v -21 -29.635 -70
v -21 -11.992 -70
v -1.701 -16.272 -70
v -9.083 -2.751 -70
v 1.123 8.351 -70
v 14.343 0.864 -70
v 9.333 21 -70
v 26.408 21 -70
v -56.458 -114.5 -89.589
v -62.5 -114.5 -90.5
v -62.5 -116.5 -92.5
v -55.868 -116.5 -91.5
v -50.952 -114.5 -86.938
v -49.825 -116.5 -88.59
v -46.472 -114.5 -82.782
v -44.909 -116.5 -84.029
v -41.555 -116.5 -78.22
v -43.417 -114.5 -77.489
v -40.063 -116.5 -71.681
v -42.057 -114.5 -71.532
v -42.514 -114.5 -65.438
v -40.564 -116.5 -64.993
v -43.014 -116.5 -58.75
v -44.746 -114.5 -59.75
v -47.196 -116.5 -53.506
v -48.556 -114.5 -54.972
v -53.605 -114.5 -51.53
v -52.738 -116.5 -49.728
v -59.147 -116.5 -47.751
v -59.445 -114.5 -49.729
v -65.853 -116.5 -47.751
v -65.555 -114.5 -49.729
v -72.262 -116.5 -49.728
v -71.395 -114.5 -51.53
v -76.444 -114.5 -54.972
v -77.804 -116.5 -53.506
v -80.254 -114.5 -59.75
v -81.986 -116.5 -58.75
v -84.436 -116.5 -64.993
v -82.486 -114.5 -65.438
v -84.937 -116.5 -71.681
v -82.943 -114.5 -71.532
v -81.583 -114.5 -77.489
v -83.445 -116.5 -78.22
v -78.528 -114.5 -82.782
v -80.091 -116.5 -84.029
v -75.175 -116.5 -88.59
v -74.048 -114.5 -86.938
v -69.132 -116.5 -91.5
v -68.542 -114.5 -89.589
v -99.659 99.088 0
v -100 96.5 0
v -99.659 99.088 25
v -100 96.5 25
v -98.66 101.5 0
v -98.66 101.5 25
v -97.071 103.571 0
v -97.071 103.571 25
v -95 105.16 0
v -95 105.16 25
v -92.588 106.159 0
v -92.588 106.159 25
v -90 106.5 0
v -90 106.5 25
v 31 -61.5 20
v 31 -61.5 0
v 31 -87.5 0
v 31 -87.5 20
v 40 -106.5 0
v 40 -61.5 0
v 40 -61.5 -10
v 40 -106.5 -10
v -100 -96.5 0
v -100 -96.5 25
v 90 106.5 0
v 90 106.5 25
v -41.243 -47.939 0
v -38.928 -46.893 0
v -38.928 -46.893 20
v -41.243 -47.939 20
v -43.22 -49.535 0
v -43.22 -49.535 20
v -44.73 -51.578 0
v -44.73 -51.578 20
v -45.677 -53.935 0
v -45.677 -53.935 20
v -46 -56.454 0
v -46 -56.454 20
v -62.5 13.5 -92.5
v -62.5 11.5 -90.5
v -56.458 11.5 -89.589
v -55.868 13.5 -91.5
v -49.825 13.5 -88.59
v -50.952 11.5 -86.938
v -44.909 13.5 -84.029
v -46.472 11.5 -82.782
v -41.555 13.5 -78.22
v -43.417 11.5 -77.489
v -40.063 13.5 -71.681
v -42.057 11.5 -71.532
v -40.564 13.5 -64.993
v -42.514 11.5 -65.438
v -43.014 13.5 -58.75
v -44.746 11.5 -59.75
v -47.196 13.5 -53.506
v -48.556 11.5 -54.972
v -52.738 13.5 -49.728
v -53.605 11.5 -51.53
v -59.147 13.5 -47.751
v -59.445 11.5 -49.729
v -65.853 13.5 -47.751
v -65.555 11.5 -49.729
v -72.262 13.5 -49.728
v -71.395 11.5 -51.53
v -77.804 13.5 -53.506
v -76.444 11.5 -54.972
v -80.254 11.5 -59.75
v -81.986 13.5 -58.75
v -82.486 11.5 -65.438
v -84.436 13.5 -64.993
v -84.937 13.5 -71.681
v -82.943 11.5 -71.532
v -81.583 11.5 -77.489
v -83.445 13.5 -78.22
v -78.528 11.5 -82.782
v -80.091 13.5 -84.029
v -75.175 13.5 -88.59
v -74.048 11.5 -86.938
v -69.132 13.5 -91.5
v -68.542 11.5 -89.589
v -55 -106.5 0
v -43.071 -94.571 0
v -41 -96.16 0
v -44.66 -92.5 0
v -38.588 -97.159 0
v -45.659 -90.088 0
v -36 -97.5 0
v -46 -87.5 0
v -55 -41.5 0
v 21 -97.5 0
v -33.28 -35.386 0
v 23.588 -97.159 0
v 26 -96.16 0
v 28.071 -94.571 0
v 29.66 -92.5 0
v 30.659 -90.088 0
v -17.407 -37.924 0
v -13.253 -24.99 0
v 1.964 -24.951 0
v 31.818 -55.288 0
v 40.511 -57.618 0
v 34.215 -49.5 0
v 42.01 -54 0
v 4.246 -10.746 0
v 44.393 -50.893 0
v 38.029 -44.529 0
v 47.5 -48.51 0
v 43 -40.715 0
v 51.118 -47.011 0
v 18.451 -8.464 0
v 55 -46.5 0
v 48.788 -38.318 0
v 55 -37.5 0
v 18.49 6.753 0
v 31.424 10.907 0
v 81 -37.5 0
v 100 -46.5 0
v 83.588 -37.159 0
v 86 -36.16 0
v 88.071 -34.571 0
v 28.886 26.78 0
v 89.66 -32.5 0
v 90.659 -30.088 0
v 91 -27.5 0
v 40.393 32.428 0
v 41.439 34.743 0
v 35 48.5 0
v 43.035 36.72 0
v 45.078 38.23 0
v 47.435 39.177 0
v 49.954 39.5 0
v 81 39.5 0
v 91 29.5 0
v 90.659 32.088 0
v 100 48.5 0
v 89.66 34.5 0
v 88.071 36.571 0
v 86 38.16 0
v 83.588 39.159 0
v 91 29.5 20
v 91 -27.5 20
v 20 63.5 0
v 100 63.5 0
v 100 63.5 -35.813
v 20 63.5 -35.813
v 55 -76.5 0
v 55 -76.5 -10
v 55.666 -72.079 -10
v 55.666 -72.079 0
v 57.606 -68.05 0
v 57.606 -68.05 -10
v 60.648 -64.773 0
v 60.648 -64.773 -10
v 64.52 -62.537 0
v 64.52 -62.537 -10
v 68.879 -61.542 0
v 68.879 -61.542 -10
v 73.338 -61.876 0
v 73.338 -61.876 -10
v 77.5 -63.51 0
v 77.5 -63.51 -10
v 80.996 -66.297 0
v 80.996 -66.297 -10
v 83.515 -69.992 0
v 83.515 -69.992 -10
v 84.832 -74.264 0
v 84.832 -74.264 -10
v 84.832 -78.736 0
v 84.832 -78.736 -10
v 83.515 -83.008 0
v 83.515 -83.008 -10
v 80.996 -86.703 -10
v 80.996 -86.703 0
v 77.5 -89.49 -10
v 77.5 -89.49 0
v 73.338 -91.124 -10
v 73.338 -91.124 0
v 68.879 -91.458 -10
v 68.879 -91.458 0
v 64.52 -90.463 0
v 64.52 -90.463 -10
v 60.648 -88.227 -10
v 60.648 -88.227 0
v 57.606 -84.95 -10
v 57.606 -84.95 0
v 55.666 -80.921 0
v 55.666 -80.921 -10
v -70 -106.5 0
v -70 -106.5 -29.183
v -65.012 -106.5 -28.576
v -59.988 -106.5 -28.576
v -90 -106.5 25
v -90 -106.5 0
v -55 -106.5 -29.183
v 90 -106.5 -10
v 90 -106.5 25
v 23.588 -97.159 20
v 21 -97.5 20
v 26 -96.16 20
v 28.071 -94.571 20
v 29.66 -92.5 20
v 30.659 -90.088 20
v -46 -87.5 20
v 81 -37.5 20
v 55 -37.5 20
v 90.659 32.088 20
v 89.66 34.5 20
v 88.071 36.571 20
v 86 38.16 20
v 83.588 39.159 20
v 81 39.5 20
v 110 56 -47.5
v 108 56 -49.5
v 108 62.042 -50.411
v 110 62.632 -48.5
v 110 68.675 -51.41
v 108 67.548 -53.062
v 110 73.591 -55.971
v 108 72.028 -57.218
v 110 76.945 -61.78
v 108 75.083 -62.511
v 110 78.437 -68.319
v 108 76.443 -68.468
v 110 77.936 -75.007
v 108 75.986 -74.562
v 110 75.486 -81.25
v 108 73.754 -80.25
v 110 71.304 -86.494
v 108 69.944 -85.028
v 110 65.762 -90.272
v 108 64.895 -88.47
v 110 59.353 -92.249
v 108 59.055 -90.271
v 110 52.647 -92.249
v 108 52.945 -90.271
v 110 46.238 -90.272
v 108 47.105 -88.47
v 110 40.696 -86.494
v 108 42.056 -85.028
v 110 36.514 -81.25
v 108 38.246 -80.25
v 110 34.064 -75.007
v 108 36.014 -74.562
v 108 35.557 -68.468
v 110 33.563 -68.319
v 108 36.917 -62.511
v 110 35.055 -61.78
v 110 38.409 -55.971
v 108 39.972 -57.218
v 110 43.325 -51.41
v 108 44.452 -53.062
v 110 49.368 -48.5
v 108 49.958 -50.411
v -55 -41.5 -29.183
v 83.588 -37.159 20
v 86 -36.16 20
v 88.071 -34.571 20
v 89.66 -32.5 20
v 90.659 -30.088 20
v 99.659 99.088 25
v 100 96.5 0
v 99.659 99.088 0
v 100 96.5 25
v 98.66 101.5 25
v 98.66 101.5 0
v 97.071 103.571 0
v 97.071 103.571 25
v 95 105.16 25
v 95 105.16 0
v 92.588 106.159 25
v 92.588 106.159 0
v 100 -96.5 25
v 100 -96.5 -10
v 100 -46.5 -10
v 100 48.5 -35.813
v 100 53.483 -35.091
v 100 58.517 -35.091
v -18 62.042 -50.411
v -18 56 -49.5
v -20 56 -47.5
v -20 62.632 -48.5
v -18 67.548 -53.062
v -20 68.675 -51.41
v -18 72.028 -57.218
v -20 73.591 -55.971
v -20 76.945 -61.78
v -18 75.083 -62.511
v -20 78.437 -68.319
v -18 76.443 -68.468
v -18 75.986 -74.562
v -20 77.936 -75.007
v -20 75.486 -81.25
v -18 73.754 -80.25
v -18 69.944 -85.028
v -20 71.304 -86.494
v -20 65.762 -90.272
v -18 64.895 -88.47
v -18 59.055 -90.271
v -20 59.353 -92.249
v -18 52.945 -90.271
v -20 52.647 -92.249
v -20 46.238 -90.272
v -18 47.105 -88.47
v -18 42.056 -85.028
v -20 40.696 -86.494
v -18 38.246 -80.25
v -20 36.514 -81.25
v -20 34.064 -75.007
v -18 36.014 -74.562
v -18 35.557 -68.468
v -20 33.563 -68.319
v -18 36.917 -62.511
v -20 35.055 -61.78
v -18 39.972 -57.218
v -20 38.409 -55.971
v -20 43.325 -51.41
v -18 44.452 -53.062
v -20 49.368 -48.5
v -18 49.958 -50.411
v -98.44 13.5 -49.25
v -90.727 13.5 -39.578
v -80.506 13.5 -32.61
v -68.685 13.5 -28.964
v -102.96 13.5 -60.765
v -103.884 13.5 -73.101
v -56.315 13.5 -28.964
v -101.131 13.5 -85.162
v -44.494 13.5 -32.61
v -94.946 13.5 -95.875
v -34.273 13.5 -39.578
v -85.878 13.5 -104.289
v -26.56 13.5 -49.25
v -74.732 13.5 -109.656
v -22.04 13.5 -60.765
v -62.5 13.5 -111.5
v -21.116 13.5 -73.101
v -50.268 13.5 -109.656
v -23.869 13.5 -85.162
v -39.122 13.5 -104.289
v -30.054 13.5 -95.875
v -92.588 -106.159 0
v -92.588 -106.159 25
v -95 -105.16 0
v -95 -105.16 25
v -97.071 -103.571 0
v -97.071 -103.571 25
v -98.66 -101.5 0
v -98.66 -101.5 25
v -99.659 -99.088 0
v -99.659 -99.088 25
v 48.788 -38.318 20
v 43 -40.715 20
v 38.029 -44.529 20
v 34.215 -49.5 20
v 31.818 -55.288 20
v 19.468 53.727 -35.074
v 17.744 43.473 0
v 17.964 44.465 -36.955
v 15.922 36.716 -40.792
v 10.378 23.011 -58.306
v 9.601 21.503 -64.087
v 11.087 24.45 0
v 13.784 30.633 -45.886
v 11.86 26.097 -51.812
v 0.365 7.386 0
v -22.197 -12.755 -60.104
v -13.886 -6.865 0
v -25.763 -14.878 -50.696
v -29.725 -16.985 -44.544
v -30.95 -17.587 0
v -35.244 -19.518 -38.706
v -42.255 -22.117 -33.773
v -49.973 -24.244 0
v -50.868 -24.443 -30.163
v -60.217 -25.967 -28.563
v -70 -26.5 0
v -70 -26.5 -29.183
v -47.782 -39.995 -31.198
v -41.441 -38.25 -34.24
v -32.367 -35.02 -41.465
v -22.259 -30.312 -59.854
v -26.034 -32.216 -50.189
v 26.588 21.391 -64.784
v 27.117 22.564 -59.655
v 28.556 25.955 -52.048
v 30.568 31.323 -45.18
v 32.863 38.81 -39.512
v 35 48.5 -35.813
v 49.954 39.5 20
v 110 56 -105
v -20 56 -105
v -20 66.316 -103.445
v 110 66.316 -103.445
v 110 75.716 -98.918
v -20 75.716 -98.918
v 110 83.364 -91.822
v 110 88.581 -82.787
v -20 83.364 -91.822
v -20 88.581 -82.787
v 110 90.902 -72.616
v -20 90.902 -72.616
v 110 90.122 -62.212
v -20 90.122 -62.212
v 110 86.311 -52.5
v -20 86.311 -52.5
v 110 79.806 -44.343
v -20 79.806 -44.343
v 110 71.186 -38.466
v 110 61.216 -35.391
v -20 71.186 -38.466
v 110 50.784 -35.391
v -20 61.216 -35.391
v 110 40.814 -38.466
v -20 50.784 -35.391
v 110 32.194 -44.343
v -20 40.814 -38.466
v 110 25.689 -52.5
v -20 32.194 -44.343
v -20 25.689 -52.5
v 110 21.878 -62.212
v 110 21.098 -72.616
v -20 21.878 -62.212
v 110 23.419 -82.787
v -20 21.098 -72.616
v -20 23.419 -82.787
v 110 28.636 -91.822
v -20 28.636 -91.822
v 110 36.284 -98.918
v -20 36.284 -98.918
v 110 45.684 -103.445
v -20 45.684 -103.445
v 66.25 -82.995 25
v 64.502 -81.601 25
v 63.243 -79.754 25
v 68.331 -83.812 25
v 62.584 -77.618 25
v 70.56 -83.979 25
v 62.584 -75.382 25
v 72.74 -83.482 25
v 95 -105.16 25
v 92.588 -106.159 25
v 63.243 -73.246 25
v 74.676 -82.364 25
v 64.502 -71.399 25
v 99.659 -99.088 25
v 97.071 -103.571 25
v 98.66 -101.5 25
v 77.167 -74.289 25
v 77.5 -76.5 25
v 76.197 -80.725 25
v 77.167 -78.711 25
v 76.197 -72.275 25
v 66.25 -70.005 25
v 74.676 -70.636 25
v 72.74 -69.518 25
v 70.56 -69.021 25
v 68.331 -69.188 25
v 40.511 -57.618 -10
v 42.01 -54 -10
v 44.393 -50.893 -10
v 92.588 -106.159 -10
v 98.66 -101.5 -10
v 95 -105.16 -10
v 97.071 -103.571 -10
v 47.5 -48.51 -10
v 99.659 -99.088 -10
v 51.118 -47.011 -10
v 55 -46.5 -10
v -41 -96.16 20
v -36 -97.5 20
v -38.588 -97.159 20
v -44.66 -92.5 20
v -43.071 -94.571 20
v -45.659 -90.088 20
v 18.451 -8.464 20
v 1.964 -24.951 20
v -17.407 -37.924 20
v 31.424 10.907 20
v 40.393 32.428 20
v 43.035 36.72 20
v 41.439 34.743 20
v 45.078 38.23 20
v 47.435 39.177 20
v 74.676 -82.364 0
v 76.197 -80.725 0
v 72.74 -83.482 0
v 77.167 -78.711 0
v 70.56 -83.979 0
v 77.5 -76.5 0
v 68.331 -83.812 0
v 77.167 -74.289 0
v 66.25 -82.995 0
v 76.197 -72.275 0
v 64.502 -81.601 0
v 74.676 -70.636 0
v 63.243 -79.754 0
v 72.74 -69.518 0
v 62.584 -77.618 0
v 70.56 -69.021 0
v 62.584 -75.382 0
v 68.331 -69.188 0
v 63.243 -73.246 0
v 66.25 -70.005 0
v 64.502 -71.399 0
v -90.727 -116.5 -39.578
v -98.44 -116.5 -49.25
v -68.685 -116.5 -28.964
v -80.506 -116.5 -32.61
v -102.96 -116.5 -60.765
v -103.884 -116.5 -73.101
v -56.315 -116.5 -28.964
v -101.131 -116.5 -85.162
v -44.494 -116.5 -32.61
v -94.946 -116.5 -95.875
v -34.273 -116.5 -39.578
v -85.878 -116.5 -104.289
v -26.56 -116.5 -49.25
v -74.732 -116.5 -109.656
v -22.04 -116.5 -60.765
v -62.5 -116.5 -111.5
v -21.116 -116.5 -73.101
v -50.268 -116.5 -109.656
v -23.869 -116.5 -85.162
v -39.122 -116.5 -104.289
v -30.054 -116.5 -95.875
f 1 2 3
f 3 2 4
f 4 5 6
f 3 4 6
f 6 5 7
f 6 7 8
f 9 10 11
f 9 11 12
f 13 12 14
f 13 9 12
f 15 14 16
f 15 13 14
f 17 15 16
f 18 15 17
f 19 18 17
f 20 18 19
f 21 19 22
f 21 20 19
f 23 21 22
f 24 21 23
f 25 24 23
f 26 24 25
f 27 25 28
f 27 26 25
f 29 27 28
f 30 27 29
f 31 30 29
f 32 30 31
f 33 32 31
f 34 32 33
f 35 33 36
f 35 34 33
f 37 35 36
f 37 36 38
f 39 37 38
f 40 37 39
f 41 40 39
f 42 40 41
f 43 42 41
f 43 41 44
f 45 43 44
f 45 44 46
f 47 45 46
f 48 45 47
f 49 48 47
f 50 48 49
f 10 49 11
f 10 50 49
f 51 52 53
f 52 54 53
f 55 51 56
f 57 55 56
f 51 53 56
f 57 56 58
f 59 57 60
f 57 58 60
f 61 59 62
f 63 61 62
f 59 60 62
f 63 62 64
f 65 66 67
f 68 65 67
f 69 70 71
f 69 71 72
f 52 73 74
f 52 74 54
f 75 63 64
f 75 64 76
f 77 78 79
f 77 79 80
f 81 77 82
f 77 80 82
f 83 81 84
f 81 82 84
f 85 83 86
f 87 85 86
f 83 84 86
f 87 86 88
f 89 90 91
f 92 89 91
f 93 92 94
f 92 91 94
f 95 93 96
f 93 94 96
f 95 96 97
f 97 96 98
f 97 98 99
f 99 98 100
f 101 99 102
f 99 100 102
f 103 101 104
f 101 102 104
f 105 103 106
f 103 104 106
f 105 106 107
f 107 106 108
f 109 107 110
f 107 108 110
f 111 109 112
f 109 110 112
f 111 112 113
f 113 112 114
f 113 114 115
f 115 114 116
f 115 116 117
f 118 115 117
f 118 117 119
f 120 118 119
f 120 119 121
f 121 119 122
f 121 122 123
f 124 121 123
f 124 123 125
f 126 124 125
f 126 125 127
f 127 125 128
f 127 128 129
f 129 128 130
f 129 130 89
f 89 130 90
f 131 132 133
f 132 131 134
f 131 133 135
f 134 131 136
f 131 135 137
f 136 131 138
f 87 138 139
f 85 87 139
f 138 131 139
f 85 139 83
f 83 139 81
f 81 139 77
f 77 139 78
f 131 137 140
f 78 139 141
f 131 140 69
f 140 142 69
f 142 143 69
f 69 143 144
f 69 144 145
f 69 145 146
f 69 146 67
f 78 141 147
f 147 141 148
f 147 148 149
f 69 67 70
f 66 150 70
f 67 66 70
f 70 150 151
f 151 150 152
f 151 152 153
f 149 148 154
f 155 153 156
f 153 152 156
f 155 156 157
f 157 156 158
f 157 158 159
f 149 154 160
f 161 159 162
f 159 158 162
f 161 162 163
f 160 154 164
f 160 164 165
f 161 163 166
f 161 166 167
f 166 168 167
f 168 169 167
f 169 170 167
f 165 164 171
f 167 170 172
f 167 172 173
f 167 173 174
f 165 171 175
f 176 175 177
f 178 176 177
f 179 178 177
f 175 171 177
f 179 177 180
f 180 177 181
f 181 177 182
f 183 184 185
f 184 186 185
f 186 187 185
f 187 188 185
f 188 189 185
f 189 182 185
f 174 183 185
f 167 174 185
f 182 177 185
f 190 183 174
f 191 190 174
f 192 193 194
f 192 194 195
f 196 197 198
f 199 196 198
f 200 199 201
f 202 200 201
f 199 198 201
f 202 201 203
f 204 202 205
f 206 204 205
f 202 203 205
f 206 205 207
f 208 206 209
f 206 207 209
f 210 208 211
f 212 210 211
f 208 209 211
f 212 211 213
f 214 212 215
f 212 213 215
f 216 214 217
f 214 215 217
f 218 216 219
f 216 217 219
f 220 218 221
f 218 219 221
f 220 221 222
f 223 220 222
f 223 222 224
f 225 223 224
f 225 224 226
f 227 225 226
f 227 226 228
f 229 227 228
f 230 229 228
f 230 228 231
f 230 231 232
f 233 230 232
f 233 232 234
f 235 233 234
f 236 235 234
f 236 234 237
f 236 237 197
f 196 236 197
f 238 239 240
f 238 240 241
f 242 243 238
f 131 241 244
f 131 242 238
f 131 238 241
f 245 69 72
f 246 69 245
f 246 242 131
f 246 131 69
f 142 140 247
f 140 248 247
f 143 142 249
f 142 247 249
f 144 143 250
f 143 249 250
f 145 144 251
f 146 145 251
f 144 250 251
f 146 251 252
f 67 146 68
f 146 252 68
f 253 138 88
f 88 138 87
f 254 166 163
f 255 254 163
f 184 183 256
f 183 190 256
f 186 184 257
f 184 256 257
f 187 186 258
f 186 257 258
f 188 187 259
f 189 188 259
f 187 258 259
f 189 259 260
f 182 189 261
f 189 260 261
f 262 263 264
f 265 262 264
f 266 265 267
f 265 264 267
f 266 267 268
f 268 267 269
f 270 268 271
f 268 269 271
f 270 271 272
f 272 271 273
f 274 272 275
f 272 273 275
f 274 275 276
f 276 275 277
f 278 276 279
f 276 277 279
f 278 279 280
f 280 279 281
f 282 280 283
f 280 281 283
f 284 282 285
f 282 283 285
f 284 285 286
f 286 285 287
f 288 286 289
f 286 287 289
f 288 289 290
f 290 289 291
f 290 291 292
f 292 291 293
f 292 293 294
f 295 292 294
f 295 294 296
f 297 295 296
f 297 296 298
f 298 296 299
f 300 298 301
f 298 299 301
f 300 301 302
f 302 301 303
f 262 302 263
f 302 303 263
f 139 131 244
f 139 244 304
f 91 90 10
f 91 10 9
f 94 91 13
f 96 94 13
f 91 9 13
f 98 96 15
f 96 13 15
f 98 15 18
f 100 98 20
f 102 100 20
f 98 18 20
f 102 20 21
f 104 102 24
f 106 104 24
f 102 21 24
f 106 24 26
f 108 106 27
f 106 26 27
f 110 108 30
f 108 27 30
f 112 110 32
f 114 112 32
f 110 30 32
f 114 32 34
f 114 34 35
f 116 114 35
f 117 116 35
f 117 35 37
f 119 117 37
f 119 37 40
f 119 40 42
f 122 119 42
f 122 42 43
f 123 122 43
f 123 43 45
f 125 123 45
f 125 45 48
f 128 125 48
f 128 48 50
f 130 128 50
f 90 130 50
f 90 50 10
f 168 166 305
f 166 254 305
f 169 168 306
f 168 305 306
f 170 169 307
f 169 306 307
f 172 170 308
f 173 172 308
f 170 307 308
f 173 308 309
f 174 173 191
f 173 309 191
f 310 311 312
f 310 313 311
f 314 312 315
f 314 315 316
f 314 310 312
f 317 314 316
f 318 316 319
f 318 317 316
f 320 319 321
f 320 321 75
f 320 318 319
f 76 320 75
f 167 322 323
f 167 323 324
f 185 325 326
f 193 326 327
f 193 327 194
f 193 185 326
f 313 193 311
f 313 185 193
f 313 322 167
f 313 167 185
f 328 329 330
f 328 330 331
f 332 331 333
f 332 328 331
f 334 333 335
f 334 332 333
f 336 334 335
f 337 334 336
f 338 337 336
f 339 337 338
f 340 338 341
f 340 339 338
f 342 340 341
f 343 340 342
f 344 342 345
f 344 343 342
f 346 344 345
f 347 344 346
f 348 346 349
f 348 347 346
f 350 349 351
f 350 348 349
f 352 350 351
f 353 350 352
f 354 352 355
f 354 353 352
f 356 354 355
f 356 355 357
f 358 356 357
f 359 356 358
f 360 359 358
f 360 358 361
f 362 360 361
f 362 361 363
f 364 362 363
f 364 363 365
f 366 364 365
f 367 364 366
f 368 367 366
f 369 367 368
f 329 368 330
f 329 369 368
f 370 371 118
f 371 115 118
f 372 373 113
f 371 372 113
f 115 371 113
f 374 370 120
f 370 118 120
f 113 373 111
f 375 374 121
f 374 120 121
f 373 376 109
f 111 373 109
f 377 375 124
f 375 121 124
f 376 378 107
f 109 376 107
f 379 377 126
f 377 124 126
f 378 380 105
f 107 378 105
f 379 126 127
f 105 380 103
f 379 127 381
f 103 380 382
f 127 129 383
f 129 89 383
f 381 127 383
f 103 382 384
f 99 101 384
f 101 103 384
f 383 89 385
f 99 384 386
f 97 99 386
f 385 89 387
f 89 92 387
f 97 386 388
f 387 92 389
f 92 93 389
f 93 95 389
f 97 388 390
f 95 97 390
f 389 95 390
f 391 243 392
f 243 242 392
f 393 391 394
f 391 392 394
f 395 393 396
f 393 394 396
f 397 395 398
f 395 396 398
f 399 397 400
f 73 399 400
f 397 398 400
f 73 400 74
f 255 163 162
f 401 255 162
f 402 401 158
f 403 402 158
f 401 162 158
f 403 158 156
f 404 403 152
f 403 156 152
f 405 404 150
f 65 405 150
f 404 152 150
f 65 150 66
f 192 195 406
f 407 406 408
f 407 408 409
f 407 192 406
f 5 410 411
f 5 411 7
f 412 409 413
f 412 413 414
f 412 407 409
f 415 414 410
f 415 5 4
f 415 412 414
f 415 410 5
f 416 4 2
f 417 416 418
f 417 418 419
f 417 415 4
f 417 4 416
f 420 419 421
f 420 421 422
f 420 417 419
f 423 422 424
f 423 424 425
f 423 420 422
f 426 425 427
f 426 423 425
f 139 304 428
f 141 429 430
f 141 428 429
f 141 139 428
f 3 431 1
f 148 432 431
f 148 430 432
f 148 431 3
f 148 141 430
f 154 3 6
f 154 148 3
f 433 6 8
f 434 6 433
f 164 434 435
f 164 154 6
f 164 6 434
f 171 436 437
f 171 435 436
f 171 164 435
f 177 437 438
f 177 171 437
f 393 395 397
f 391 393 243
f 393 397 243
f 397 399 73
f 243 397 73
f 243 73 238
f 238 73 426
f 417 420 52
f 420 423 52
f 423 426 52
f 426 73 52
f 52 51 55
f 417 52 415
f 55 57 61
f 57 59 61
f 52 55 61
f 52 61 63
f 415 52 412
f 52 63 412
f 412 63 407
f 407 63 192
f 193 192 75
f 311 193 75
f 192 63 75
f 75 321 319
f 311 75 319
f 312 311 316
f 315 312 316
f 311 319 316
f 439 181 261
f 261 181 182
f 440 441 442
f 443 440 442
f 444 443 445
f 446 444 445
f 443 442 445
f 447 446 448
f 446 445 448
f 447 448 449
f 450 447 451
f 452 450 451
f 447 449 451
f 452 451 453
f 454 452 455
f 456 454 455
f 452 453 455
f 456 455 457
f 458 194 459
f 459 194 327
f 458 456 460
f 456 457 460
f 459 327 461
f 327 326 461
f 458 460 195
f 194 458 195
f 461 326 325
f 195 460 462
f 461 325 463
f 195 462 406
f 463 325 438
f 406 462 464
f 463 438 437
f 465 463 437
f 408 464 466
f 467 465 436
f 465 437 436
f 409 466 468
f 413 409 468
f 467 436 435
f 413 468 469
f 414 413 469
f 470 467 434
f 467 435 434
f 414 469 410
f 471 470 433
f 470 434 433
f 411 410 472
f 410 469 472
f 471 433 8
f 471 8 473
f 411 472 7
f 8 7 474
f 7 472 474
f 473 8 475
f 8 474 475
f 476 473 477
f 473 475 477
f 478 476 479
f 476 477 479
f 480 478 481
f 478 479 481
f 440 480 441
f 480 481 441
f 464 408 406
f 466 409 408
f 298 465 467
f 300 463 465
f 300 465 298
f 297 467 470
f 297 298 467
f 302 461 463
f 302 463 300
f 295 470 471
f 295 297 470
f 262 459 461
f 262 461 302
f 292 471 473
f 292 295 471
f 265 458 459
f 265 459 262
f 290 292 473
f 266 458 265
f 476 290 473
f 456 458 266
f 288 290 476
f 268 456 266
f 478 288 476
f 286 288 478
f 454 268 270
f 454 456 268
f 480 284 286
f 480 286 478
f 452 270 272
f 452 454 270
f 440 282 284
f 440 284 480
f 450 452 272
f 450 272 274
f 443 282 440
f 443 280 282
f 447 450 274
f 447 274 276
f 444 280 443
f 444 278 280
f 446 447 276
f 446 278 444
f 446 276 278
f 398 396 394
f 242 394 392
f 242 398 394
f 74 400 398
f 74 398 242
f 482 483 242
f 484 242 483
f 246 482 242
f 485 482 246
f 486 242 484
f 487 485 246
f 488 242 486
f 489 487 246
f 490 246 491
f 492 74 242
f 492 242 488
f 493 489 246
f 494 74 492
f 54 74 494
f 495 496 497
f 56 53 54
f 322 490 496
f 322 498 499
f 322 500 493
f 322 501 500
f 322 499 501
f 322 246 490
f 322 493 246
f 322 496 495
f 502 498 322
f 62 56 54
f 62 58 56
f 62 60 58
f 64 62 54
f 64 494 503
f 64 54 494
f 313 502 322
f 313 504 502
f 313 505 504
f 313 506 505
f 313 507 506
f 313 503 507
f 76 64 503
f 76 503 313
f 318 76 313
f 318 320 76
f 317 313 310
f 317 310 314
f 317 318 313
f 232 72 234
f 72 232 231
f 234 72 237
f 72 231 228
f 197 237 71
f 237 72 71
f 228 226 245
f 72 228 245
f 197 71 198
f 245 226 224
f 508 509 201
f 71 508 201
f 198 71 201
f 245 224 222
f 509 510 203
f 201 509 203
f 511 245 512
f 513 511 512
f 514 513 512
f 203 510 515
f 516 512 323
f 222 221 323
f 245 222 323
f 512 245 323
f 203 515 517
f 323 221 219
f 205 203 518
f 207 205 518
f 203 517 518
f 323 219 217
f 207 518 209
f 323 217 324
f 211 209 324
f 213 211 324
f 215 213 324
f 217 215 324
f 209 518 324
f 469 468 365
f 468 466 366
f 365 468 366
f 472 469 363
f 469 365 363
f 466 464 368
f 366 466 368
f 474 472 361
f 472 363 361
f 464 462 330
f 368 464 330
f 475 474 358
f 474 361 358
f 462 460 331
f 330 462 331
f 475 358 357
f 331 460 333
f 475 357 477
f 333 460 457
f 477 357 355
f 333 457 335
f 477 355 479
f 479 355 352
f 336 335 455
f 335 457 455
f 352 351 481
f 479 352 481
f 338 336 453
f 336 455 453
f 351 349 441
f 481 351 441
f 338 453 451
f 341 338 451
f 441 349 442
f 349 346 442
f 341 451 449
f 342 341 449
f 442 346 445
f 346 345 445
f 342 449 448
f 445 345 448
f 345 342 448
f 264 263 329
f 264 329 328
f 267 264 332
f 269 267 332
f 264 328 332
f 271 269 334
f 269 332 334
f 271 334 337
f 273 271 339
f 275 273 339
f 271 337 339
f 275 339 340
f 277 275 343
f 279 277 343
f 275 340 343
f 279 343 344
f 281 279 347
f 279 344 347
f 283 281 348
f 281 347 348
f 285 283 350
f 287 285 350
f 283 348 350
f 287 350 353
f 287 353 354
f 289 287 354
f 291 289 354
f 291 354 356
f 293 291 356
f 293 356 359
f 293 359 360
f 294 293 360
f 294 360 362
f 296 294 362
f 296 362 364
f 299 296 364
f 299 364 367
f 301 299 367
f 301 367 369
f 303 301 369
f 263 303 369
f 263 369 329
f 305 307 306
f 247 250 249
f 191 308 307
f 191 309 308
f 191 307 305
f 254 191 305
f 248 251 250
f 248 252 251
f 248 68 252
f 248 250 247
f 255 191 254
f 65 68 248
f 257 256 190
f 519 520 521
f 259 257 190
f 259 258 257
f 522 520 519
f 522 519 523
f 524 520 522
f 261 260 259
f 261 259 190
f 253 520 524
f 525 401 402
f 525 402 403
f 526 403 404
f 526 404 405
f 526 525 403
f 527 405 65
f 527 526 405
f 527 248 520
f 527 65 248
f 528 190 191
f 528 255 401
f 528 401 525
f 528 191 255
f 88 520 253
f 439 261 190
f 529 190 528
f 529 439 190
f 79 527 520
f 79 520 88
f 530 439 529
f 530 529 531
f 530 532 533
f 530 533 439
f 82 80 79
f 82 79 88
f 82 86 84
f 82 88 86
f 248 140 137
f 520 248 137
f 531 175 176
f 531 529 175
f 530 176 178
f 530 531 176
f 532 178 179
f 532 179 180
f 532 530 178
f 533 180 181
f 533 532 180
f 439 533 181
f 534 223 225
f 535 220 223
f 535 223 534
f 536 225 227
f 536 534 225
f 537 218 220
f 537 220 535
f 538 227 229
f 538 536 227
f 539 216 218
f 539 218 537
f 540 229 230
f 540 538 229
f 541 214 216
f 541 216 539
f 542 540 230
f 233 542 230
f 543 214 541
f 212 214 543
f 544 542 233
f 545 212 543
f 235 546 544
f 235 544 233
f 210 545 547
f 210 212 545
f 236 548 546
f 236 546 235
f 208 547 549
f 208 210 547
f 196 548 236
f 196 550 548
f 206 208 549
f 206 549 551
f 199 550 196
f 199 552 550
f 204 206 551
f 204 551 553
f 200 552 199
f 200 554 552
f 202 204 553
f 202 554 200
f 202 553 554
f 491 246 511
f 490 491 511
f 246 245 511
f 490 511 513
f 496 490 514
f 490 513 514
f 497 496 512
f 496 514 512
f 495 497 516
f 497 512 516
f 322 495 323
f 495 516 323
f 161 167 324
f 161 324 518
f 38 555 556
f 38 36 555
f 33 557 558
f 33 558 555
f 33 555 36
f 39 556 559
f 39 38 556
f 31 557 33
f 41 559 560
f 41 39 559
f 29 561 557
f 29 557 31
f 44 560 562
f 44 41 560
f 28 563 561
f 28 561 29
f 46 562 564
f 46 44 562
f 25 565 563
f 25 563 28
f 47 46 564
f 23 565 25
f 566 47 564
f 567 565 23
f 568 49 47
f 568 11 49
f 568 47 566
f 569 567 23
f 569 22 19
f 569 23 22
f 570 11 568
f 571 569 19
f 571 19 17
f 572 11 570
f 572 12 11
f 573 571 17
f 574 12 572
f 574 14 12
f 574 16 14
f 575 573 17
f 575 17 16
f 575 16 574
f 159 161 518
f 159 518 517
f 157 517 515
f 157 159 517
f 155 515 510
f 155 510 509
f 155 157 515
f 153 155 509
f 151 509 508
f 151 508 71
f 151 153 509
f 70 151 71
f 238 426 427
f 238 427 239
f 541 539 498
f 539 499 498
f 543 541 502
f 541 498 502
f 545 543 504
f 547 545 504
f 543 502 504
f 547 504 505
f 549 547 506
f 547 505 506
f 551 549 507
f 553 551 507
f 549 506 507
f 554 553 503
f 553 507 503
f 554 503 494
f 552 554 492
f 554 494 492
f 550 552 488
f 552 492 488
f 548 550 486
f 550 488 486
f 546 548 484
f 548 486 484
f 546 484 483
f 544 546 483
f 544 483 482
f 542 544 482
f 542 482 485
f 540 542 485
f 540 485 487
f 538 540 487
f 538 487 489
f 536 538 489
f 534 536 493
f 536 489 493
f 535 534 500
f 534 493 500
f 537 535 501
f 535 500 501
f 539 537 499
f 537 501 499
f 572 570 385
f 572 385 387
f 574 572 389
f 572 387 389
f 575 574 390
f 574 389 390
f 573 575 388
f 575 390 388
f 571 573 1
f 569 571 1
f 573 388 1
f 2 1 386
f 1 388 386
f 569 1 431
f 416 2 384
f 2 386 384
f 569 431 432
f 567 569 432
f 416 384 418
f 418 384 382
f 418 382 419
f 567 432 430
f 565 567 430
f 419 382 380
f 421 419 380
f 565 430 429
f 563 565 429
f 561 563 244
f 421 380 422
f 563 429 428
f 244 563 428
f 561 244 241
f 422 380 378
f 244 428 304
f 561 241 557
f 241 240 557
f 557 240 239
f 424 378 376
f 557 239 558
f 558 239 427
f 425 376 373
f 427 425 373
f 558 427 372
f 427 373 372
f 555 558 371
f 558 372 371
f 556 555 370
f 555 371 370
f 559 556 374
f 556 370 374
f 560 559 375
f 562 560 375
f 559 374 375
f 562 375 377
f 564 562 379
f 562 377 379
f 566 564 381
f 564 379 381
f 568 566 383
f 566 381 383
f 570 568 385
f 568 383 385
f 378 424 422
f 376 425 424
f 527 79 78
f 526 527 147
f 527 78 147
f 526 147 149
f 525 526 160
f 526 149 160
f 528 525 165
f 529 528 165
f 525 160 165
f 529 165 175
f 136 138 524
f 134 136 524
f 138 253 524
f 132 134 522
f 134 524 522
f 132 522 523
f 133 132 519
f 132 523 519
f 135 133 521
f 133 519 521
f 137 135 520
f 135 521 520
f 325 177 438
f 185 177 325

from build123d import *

# Parameters (mm, degrees)
SKETCH1_W                               = 200
SKETCH1_H                               = 213
BOSS_EXTRUDE1_DEPTH                     = 25
BOSS_EXTRUDE2_DEPTH                     = 10
BOSS_EXTRUDE3_DEPTH                     = 70
CUT_EXTRUDE1_DEPTH                      = 20
BOSS_EXTRUDE5_DEPTH                     = 10
BOSS_EXTRUDE5_DEPTH_BACK                = 120
SKETCH5_R                               = 35
BOSS_EXTRUDE6_DEPTH                     = 10
BOSS_EXTRUDE6_DEPTH_BACK                = 120
SKETCH6_R                               = 41.5
CUT_EXTRUDE2_REACH                      = 274.509
SKETCH7_R                               = 20.5
CUT_EXTRUDE3_REACH                      = 209.134
SKETCH8_R                               = 20.5
CBORE_FOR_M8_HEX_HEAD_BOLT1_D           = 15
CBORE_FOR_M8_HEX_HEAD_BOLT1_CBORE_D     = 30
CBORE_FOR_M8_HEX_HEAD_BOLT1_CBORE_DEPTH = 10
CHAMFER1_SIZE                           = 2
FILLET1_R                               = 10


with BuildPart() as part:
    # Sketch1 → Boss-Extrude1 (new body)
    with BuildSketch(Plane.XY):
        Rectangle(SKETCH1_W, SKETCH1_H)
    extrude(amount=BOSS_EXTRUDE1_DEPTH)

    # Sketch2 → Boss-Extrude2 (add)
    with BuildSketch(Plane.XY):
        with BuildLine():
            Line((100, -46.5), (55, -46.5))
            ThreePointArc((55, -46.5), (44.393398282, -50.893398282), (40, -61.5))
            Line((40, -61.5), (40, -106.5))
            Line((40, -106.5), (100, -106.5))
            Line((100, -106.5), (100, -46.5))
        make_face()
    extrude(amount=-BOSS_EXTRUDE2_DEPTH)

    # Sketch3 → Boss-Extrude3 (add)
    with BuildSketch(Plane(origin=(0, 0, 0), x_dir=(-1, 0, 0), z_dir=(0, 0, -1))):
        with BuildLine():
            Line((-100, 63.5), (-20, 63.5))
            ThreePointArc((-20, 63.5), (6.360389693, -0.139610307), (70, -26.5))
            Line((70, -26.5), (70, -106.5))
            Line((70, -106.5), (55, -106.5))
            Line((55, -106.5), (55, -41.5))
            ThreePointArc((55, -41.5), (-4.246212025, -10.746212025), (-35, 48.5))
            Line((-35, 48.5), (-100, 48.5))
            Line((-100, 48.5), (-100, 63.5))
        make_face()
    extrude(amount=BOSS_EXTRUDE3_DEPTH)

    # Sketch4 → Cut-Extrude1 (cut)
    with BuildSketch(Plane(origin=(0, 0, 0), x_dir=(-1, 0, 0), z_dir=(0, 0, -1))):
        with BuildLine():
            Line((-42.323661941, 39.5), (-91, 39.5))
            Line((-91, 39.5), (-91, -37.5))
            Line((-91, -37.5), (-55, -37.5))
            ThreePointArc((-55, -37.5), (-38.029437252, -44.529437252), (-31, -61.5))
            Line((-31, -61.5), (-31, -97.5))
            Line((-31, -97.5), (46, -97.5))
            Line((46, -97.5), (46, -48.823661941))
            ThreePointArc((46, -48.823661941), (-10.610173055, -17.110173055), (-42.323661941, 39.5))
        make_face()
    extrude(amount=-CUT_EXTRUDE1_DEPTH, mode=Mode.SUBTRACT)

    # Sketch5 → Boss-Extrude5 (add, two sides: drawn at the far end of the back side and taken through both)
    with BuildSketch(Plane(origin=(100, 0, 0), x_dir=(0, 0, -1), z_dir=(1, 0, 0)).offset(-BOSS_EXTRUDE5_DEPTH_BACK)):
        with Locations((70, 56)):
            Circle(SKETCH5_R)
    extrude(amount=BOSS_EXTRUDE5_DEPTH + BOSS_EXTRUDE5_DEPTH_BACK)

    # Sketch6 → Boss-Extrude6 (add, two sides: drawn at the far end of the back side and taken through both)
    with BuildSketch(Plane.XZ.offset(106.5).offset(-BOSS_EXTRUDE6_DEPTH_BACK)):
        with Locations(Location((-62.5, -70, 0), (0, 0, 270))):
            Circle(SKETCH6_R)
    extrude(amount=BOSS_EXTRUDE6_DEPTH + BOSS_EXTRUDE6_DEPTH_BACK)

    # Sketch7 → Cut-Extrude2 (cut, up to next)
    with BuildSketch(Plane.XZ.offset(116.5), mode=Mode.PRIVATE) as cut_extrude2_sk1:
        with Locations(Location((-62.5, -70, 0), (0, 0, 270))):
            Circle(SKETCH7_R)
    cut_extrude2_tool1 = extrude(cut_extrude2_sk1.sketch, amount=-CUT_EXTRUDE2_REACH, mode=Mode.PRIVATE) & part.part
    add(cut_extrude2_tool1.solids().sort_by_distance((-62.5, -116.5, -70))[0], mode=Mode.SUBTRACT)

    # Sketch8 → Cut-Extrude3 (cut, up to next)
    with BuildSketch(Plane.ZY.offset(20), mode=Mode.PRIVATE) as cut_extrude3_sk1:
        with Locations((-70, 56)):
            Circle(SKETCH8_R)
    cut_extrude3_tool1 = extrude(cut_extrude3_sk1.sketch, amount=-CUT_EXTRUDE3_REACH, mode=Mode.PRIVATE) & part.part
    add(cut_extrude3_tool1.solids().sort_by_distance((-20, 56, -70))[0], mode=Mode.SUBTRACT)

    # CBORE for M8 Hex Head Bolt1 (through all)
    with Locations(Plane(origin=(70, -76.5, -10), x_dir=(-1, 0, 0), z_dir=(0, 0, -1))):
        with Locations((0, 0)):
            CounterBoreHole(CBORE_FOR_M8_HEX_HEAD_BOLT1_D / 2, CBORE_FOR_M8_HEX_HEAD_BOLT1_CBORE_D / 2, CBORE_FOR_M8_HEX_HEAD_BOLT1_CBORE_DEPTH)

    # Chamfer1
    chamfer1_edges = [part.edges().sort_by_distance(p)[0] for p in [
        (-62.5, -116.5, -49.5),
        (-62.5, 13.5, -49.5),
        (110, 56, -90.5),
        (-20, 56, -90.5),
    ]]
    chamfer(chamfer1_edges, length=CHAMFER1_SIZE)

    # Fillet1
    fillet1_edges = [part.edges().sort_by_distance(p)[0] for p in [
        (42.323661941, 39.5, 10),
        (-46, -48.823661941, 10),
        (-46, -97.5, 10),
        (31, -97.5, 10),
        (91, -37.5, 10),
        (91, 39.5, 10),
        (100, -106.5, 7.5),
        (-100, -106.5, 12.5),
        (-100, 106.5, 12.5),
        (100, 106.5, 12.5),
    ]]
    fillet(fillet1_edges, radius=FILLET1_R)


solid = part.part
